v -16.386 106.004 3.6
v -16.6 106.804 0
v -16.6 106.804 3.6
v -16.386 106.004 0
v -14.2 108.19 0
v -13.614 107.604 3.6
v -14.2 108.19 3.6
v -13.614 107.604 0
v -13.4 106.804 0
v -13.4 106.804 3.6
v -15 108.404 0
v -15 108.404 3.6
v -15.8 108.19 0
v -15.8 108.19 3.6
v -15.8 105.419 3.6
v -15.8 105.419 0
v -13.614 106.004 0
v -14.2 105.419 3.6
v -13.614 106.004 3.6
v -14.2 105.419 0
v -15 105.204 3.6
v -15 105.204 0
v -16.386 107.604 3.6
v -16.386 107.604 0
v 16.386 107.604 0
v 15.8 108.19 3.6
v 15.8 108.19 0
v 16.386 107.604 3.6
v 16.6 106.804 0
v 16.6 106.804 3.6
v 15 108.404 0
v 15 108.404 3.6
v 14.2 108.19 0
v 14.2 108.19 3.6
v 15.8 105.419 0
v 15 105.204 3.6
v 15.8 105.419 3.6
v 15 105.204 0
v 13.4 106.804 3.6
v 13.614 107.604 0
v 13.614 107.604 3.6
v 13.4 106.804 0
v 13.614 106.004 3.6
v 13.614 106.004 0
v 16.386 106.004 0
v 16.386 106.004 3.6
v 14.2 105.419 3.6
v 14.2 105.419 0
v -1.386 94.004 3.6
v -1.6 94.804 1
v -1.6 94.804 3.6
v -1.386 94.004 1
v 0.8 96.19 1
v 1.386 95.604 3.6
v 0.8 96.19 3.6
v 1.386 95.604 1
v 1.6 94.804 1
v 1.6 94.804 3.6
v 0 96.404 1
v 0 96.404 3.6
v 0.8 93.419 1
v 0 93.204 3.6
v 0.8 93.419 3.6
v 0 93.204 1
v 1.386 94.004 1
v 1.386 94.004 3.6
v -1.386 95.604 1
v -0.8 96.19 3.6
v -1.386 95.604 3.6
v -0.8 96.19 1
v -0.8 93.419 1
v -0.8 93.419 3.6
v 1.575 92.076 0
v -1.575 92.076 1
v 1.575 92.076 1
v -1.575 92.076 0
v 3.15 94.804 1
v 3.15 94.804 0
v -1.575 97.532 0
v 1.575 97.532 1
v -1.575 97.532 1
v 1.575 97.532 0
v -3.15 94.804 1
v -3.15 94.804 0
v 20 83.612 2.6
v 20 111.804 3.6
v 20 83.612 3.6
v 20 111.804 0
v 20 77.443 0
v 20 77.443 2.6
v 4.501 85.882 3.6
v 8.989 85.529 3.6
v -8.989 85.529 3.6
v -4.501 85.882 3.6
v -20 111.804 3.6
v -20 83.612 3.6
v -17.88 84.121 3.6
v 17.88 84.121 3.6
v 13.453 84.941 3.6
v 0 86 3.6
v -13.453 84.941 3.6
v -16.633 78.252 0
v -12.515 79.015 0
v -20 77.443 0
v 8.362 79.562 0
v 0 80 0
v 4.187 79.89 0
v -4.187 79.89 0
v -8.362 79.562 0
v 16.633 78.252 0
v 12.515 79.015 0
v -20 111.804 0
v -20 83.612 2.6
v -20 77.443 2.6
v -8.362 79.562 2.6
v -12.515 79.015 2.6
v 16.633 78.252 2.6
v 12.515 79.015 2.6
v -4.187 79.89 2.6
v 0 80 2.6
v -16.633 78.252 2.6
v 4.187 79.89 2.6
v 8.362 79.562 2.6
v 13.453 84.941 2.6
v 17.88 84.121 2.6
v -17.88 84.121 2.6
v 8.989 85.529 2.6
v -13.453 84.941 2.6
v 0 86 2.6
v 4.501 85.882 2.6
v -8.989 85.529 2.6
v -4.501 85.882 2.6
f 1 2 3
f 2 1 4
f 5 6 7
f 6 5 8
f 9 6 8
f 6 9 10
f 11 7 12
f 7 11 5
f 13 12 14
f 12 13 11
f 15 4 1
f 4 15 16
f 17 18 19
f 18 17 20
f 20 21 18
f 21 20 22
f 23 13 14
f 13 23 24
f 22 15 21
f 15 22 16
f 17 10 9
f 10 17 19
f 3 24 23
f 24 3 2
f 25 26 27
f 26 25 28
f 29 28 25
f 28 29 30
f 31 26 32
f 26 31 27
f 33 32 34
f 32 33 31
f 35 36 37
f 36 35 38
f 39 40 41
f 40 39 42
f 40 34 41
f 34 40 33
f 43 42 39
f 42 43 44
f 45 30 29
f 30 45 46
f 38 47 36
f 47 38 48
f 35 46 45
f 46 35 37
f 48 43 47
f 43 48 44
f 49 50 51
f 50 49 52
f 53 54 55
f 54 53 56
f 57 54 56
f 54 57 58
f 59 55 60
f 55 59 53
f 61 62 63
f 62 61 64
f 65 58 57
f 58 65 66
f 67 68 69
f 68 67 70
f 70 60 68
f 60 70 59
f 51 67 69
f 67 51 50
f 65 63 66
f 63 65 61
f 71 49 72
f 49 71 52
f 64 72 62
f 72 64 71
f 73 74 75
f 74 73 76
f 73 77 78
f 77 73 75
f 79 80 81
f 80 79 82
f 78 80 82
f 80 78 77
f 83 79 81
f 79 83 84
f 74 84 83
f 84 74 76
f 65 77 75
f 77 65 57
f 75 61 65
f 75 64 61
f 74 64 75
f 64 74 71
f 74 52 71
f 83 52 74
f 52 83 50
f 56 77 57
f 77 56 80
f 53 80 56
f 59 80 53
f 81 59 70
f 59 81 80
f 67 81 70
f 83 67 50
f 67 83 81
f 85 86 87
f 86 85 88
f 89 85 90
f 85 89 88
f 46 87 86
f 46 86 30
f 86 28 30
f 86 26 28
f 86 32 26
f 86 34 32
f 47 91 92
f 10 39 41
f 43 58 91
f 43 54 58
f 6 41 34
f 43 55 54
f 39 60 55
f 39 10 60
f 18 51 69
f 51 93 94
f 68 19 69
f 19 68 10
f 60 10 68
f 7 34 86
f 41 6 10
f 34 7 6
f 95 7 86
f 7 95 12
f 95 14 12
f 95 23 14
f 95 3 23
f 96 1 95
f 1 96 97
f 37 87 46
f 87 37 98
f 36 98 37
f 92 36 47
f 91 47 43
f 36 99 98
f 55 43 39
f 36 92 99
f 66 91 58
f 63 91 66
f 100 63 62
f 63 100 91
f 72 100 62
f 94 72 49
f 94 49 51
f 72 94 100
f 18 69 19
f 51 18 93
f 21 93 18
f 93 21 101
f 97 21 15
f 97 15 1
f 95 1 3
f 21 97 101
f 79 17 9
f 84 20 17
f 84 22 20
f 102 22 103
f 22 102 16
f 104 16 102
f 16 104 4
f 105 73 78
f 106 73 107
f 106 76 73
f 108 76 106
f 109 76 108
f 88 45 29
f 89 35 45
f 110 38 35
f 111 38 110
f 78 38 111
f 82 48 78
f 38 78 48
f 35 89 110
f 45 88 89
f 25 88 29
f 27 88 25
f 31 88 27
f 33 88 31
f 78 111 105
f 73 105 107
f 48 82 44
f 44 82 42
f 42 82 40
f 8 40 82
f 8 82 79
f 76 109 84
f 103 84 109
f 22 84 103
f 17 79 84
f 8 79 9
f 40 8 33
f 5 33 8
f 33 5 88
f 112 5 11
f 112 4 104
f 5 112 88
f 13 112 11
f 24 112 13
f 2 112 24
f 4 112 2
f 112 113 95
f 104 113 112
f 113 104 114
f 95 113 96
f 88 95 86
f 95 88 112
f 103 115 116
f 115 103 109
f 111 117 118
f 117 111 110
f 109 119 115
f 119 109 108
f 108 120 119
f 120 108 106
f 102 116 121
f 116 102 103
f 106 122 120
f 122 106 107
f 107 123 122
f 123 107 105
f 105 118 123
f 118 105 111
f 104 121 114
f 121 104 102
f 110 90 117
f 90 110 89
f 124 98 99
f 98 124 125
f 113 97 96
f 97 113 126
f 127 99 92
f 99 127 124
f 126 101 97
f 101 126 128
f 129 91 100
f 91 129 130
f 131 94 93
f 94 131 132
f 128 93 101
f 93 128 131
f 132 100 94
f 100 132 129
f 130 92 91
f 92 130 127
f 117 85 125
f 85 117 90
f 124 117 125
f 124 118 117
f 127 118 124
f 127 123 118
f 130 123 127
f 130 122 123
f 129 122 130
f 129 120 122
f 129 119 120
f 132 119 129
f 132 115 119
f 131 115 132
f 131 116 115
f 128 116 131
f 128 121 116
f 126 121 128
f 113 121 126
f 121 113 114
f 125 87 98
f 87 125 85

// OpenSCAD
// file: configuration.scad
// OD = outside diameter, corner to corner.
m3_nut_od = 6.1;
m3_nut_radius = (m3_nut_od+0.2)/2;

// Major diameter of metric 3mm thread.
m3_major = 2.85;
m3_radius = m3_major/2;
m3_wide_radius = 3.2/2;

// NEMA17 stepper motors.
motor_shaft_diameter = 5;
motor_shaft_radius = (motor_shaft_diameter+0.3)/2;

// Frame brackets.
thickness = 3.6;
// main file
include <configuration.scad>;

triangle_openbeam = 300; // mm length

// Intersection points between inside edges of triangle OpenBeam.
triangle_inside = triangle_openbeam + 44;

// Distance from center to inside edge of OpenBeam.
triangle_offset = triangle_inside/2 * tan(30) + 7.5;

// Borosilicate glass.
glass_diameter = 170;
glass_radius = glass_diameter/2;
glass_thickness = 2.9;
translate([0, 0, thickness]) %
  cylinder(r=glass_radius, h=glass_thickness, $fn=120);

// OpenBeam triangle.
for (a = [0:120:359]) {
  rotate([0, 0, a]) {
    translate([0, triangle_offset, -7.5]) %
      cube([triangle_openbeam, 15, 15], center=true);
  }
}


module frame_glass() {
  difference() {
    translate([0, triangle_offset+5-20, thickness/2])
      cube([40, 40, thickness], center=true);
    cylinder(r=glass_radius-5, h=20, center=true, $fn=120);
    translate([0, 0, thickness-1])
      cylinder(r=glass_radius+1, h=glass_thickness, $fn=120);
    for (x = [-15, 15]) {
      translate([x, triangle_offset, 0]) #
        cylinder(r=m3_wide_radius, h=20, center=true, $fn=12);
    }
    translate([0, triangle_offset-12, 0]) {
      cylinder(r=m3_wide_radius, h=20, center=true, $fn=12);
      cylinder(r=m3_nut_radius, h=2, center=true, $fn=6);
    }
  }
}

frame_glass();
